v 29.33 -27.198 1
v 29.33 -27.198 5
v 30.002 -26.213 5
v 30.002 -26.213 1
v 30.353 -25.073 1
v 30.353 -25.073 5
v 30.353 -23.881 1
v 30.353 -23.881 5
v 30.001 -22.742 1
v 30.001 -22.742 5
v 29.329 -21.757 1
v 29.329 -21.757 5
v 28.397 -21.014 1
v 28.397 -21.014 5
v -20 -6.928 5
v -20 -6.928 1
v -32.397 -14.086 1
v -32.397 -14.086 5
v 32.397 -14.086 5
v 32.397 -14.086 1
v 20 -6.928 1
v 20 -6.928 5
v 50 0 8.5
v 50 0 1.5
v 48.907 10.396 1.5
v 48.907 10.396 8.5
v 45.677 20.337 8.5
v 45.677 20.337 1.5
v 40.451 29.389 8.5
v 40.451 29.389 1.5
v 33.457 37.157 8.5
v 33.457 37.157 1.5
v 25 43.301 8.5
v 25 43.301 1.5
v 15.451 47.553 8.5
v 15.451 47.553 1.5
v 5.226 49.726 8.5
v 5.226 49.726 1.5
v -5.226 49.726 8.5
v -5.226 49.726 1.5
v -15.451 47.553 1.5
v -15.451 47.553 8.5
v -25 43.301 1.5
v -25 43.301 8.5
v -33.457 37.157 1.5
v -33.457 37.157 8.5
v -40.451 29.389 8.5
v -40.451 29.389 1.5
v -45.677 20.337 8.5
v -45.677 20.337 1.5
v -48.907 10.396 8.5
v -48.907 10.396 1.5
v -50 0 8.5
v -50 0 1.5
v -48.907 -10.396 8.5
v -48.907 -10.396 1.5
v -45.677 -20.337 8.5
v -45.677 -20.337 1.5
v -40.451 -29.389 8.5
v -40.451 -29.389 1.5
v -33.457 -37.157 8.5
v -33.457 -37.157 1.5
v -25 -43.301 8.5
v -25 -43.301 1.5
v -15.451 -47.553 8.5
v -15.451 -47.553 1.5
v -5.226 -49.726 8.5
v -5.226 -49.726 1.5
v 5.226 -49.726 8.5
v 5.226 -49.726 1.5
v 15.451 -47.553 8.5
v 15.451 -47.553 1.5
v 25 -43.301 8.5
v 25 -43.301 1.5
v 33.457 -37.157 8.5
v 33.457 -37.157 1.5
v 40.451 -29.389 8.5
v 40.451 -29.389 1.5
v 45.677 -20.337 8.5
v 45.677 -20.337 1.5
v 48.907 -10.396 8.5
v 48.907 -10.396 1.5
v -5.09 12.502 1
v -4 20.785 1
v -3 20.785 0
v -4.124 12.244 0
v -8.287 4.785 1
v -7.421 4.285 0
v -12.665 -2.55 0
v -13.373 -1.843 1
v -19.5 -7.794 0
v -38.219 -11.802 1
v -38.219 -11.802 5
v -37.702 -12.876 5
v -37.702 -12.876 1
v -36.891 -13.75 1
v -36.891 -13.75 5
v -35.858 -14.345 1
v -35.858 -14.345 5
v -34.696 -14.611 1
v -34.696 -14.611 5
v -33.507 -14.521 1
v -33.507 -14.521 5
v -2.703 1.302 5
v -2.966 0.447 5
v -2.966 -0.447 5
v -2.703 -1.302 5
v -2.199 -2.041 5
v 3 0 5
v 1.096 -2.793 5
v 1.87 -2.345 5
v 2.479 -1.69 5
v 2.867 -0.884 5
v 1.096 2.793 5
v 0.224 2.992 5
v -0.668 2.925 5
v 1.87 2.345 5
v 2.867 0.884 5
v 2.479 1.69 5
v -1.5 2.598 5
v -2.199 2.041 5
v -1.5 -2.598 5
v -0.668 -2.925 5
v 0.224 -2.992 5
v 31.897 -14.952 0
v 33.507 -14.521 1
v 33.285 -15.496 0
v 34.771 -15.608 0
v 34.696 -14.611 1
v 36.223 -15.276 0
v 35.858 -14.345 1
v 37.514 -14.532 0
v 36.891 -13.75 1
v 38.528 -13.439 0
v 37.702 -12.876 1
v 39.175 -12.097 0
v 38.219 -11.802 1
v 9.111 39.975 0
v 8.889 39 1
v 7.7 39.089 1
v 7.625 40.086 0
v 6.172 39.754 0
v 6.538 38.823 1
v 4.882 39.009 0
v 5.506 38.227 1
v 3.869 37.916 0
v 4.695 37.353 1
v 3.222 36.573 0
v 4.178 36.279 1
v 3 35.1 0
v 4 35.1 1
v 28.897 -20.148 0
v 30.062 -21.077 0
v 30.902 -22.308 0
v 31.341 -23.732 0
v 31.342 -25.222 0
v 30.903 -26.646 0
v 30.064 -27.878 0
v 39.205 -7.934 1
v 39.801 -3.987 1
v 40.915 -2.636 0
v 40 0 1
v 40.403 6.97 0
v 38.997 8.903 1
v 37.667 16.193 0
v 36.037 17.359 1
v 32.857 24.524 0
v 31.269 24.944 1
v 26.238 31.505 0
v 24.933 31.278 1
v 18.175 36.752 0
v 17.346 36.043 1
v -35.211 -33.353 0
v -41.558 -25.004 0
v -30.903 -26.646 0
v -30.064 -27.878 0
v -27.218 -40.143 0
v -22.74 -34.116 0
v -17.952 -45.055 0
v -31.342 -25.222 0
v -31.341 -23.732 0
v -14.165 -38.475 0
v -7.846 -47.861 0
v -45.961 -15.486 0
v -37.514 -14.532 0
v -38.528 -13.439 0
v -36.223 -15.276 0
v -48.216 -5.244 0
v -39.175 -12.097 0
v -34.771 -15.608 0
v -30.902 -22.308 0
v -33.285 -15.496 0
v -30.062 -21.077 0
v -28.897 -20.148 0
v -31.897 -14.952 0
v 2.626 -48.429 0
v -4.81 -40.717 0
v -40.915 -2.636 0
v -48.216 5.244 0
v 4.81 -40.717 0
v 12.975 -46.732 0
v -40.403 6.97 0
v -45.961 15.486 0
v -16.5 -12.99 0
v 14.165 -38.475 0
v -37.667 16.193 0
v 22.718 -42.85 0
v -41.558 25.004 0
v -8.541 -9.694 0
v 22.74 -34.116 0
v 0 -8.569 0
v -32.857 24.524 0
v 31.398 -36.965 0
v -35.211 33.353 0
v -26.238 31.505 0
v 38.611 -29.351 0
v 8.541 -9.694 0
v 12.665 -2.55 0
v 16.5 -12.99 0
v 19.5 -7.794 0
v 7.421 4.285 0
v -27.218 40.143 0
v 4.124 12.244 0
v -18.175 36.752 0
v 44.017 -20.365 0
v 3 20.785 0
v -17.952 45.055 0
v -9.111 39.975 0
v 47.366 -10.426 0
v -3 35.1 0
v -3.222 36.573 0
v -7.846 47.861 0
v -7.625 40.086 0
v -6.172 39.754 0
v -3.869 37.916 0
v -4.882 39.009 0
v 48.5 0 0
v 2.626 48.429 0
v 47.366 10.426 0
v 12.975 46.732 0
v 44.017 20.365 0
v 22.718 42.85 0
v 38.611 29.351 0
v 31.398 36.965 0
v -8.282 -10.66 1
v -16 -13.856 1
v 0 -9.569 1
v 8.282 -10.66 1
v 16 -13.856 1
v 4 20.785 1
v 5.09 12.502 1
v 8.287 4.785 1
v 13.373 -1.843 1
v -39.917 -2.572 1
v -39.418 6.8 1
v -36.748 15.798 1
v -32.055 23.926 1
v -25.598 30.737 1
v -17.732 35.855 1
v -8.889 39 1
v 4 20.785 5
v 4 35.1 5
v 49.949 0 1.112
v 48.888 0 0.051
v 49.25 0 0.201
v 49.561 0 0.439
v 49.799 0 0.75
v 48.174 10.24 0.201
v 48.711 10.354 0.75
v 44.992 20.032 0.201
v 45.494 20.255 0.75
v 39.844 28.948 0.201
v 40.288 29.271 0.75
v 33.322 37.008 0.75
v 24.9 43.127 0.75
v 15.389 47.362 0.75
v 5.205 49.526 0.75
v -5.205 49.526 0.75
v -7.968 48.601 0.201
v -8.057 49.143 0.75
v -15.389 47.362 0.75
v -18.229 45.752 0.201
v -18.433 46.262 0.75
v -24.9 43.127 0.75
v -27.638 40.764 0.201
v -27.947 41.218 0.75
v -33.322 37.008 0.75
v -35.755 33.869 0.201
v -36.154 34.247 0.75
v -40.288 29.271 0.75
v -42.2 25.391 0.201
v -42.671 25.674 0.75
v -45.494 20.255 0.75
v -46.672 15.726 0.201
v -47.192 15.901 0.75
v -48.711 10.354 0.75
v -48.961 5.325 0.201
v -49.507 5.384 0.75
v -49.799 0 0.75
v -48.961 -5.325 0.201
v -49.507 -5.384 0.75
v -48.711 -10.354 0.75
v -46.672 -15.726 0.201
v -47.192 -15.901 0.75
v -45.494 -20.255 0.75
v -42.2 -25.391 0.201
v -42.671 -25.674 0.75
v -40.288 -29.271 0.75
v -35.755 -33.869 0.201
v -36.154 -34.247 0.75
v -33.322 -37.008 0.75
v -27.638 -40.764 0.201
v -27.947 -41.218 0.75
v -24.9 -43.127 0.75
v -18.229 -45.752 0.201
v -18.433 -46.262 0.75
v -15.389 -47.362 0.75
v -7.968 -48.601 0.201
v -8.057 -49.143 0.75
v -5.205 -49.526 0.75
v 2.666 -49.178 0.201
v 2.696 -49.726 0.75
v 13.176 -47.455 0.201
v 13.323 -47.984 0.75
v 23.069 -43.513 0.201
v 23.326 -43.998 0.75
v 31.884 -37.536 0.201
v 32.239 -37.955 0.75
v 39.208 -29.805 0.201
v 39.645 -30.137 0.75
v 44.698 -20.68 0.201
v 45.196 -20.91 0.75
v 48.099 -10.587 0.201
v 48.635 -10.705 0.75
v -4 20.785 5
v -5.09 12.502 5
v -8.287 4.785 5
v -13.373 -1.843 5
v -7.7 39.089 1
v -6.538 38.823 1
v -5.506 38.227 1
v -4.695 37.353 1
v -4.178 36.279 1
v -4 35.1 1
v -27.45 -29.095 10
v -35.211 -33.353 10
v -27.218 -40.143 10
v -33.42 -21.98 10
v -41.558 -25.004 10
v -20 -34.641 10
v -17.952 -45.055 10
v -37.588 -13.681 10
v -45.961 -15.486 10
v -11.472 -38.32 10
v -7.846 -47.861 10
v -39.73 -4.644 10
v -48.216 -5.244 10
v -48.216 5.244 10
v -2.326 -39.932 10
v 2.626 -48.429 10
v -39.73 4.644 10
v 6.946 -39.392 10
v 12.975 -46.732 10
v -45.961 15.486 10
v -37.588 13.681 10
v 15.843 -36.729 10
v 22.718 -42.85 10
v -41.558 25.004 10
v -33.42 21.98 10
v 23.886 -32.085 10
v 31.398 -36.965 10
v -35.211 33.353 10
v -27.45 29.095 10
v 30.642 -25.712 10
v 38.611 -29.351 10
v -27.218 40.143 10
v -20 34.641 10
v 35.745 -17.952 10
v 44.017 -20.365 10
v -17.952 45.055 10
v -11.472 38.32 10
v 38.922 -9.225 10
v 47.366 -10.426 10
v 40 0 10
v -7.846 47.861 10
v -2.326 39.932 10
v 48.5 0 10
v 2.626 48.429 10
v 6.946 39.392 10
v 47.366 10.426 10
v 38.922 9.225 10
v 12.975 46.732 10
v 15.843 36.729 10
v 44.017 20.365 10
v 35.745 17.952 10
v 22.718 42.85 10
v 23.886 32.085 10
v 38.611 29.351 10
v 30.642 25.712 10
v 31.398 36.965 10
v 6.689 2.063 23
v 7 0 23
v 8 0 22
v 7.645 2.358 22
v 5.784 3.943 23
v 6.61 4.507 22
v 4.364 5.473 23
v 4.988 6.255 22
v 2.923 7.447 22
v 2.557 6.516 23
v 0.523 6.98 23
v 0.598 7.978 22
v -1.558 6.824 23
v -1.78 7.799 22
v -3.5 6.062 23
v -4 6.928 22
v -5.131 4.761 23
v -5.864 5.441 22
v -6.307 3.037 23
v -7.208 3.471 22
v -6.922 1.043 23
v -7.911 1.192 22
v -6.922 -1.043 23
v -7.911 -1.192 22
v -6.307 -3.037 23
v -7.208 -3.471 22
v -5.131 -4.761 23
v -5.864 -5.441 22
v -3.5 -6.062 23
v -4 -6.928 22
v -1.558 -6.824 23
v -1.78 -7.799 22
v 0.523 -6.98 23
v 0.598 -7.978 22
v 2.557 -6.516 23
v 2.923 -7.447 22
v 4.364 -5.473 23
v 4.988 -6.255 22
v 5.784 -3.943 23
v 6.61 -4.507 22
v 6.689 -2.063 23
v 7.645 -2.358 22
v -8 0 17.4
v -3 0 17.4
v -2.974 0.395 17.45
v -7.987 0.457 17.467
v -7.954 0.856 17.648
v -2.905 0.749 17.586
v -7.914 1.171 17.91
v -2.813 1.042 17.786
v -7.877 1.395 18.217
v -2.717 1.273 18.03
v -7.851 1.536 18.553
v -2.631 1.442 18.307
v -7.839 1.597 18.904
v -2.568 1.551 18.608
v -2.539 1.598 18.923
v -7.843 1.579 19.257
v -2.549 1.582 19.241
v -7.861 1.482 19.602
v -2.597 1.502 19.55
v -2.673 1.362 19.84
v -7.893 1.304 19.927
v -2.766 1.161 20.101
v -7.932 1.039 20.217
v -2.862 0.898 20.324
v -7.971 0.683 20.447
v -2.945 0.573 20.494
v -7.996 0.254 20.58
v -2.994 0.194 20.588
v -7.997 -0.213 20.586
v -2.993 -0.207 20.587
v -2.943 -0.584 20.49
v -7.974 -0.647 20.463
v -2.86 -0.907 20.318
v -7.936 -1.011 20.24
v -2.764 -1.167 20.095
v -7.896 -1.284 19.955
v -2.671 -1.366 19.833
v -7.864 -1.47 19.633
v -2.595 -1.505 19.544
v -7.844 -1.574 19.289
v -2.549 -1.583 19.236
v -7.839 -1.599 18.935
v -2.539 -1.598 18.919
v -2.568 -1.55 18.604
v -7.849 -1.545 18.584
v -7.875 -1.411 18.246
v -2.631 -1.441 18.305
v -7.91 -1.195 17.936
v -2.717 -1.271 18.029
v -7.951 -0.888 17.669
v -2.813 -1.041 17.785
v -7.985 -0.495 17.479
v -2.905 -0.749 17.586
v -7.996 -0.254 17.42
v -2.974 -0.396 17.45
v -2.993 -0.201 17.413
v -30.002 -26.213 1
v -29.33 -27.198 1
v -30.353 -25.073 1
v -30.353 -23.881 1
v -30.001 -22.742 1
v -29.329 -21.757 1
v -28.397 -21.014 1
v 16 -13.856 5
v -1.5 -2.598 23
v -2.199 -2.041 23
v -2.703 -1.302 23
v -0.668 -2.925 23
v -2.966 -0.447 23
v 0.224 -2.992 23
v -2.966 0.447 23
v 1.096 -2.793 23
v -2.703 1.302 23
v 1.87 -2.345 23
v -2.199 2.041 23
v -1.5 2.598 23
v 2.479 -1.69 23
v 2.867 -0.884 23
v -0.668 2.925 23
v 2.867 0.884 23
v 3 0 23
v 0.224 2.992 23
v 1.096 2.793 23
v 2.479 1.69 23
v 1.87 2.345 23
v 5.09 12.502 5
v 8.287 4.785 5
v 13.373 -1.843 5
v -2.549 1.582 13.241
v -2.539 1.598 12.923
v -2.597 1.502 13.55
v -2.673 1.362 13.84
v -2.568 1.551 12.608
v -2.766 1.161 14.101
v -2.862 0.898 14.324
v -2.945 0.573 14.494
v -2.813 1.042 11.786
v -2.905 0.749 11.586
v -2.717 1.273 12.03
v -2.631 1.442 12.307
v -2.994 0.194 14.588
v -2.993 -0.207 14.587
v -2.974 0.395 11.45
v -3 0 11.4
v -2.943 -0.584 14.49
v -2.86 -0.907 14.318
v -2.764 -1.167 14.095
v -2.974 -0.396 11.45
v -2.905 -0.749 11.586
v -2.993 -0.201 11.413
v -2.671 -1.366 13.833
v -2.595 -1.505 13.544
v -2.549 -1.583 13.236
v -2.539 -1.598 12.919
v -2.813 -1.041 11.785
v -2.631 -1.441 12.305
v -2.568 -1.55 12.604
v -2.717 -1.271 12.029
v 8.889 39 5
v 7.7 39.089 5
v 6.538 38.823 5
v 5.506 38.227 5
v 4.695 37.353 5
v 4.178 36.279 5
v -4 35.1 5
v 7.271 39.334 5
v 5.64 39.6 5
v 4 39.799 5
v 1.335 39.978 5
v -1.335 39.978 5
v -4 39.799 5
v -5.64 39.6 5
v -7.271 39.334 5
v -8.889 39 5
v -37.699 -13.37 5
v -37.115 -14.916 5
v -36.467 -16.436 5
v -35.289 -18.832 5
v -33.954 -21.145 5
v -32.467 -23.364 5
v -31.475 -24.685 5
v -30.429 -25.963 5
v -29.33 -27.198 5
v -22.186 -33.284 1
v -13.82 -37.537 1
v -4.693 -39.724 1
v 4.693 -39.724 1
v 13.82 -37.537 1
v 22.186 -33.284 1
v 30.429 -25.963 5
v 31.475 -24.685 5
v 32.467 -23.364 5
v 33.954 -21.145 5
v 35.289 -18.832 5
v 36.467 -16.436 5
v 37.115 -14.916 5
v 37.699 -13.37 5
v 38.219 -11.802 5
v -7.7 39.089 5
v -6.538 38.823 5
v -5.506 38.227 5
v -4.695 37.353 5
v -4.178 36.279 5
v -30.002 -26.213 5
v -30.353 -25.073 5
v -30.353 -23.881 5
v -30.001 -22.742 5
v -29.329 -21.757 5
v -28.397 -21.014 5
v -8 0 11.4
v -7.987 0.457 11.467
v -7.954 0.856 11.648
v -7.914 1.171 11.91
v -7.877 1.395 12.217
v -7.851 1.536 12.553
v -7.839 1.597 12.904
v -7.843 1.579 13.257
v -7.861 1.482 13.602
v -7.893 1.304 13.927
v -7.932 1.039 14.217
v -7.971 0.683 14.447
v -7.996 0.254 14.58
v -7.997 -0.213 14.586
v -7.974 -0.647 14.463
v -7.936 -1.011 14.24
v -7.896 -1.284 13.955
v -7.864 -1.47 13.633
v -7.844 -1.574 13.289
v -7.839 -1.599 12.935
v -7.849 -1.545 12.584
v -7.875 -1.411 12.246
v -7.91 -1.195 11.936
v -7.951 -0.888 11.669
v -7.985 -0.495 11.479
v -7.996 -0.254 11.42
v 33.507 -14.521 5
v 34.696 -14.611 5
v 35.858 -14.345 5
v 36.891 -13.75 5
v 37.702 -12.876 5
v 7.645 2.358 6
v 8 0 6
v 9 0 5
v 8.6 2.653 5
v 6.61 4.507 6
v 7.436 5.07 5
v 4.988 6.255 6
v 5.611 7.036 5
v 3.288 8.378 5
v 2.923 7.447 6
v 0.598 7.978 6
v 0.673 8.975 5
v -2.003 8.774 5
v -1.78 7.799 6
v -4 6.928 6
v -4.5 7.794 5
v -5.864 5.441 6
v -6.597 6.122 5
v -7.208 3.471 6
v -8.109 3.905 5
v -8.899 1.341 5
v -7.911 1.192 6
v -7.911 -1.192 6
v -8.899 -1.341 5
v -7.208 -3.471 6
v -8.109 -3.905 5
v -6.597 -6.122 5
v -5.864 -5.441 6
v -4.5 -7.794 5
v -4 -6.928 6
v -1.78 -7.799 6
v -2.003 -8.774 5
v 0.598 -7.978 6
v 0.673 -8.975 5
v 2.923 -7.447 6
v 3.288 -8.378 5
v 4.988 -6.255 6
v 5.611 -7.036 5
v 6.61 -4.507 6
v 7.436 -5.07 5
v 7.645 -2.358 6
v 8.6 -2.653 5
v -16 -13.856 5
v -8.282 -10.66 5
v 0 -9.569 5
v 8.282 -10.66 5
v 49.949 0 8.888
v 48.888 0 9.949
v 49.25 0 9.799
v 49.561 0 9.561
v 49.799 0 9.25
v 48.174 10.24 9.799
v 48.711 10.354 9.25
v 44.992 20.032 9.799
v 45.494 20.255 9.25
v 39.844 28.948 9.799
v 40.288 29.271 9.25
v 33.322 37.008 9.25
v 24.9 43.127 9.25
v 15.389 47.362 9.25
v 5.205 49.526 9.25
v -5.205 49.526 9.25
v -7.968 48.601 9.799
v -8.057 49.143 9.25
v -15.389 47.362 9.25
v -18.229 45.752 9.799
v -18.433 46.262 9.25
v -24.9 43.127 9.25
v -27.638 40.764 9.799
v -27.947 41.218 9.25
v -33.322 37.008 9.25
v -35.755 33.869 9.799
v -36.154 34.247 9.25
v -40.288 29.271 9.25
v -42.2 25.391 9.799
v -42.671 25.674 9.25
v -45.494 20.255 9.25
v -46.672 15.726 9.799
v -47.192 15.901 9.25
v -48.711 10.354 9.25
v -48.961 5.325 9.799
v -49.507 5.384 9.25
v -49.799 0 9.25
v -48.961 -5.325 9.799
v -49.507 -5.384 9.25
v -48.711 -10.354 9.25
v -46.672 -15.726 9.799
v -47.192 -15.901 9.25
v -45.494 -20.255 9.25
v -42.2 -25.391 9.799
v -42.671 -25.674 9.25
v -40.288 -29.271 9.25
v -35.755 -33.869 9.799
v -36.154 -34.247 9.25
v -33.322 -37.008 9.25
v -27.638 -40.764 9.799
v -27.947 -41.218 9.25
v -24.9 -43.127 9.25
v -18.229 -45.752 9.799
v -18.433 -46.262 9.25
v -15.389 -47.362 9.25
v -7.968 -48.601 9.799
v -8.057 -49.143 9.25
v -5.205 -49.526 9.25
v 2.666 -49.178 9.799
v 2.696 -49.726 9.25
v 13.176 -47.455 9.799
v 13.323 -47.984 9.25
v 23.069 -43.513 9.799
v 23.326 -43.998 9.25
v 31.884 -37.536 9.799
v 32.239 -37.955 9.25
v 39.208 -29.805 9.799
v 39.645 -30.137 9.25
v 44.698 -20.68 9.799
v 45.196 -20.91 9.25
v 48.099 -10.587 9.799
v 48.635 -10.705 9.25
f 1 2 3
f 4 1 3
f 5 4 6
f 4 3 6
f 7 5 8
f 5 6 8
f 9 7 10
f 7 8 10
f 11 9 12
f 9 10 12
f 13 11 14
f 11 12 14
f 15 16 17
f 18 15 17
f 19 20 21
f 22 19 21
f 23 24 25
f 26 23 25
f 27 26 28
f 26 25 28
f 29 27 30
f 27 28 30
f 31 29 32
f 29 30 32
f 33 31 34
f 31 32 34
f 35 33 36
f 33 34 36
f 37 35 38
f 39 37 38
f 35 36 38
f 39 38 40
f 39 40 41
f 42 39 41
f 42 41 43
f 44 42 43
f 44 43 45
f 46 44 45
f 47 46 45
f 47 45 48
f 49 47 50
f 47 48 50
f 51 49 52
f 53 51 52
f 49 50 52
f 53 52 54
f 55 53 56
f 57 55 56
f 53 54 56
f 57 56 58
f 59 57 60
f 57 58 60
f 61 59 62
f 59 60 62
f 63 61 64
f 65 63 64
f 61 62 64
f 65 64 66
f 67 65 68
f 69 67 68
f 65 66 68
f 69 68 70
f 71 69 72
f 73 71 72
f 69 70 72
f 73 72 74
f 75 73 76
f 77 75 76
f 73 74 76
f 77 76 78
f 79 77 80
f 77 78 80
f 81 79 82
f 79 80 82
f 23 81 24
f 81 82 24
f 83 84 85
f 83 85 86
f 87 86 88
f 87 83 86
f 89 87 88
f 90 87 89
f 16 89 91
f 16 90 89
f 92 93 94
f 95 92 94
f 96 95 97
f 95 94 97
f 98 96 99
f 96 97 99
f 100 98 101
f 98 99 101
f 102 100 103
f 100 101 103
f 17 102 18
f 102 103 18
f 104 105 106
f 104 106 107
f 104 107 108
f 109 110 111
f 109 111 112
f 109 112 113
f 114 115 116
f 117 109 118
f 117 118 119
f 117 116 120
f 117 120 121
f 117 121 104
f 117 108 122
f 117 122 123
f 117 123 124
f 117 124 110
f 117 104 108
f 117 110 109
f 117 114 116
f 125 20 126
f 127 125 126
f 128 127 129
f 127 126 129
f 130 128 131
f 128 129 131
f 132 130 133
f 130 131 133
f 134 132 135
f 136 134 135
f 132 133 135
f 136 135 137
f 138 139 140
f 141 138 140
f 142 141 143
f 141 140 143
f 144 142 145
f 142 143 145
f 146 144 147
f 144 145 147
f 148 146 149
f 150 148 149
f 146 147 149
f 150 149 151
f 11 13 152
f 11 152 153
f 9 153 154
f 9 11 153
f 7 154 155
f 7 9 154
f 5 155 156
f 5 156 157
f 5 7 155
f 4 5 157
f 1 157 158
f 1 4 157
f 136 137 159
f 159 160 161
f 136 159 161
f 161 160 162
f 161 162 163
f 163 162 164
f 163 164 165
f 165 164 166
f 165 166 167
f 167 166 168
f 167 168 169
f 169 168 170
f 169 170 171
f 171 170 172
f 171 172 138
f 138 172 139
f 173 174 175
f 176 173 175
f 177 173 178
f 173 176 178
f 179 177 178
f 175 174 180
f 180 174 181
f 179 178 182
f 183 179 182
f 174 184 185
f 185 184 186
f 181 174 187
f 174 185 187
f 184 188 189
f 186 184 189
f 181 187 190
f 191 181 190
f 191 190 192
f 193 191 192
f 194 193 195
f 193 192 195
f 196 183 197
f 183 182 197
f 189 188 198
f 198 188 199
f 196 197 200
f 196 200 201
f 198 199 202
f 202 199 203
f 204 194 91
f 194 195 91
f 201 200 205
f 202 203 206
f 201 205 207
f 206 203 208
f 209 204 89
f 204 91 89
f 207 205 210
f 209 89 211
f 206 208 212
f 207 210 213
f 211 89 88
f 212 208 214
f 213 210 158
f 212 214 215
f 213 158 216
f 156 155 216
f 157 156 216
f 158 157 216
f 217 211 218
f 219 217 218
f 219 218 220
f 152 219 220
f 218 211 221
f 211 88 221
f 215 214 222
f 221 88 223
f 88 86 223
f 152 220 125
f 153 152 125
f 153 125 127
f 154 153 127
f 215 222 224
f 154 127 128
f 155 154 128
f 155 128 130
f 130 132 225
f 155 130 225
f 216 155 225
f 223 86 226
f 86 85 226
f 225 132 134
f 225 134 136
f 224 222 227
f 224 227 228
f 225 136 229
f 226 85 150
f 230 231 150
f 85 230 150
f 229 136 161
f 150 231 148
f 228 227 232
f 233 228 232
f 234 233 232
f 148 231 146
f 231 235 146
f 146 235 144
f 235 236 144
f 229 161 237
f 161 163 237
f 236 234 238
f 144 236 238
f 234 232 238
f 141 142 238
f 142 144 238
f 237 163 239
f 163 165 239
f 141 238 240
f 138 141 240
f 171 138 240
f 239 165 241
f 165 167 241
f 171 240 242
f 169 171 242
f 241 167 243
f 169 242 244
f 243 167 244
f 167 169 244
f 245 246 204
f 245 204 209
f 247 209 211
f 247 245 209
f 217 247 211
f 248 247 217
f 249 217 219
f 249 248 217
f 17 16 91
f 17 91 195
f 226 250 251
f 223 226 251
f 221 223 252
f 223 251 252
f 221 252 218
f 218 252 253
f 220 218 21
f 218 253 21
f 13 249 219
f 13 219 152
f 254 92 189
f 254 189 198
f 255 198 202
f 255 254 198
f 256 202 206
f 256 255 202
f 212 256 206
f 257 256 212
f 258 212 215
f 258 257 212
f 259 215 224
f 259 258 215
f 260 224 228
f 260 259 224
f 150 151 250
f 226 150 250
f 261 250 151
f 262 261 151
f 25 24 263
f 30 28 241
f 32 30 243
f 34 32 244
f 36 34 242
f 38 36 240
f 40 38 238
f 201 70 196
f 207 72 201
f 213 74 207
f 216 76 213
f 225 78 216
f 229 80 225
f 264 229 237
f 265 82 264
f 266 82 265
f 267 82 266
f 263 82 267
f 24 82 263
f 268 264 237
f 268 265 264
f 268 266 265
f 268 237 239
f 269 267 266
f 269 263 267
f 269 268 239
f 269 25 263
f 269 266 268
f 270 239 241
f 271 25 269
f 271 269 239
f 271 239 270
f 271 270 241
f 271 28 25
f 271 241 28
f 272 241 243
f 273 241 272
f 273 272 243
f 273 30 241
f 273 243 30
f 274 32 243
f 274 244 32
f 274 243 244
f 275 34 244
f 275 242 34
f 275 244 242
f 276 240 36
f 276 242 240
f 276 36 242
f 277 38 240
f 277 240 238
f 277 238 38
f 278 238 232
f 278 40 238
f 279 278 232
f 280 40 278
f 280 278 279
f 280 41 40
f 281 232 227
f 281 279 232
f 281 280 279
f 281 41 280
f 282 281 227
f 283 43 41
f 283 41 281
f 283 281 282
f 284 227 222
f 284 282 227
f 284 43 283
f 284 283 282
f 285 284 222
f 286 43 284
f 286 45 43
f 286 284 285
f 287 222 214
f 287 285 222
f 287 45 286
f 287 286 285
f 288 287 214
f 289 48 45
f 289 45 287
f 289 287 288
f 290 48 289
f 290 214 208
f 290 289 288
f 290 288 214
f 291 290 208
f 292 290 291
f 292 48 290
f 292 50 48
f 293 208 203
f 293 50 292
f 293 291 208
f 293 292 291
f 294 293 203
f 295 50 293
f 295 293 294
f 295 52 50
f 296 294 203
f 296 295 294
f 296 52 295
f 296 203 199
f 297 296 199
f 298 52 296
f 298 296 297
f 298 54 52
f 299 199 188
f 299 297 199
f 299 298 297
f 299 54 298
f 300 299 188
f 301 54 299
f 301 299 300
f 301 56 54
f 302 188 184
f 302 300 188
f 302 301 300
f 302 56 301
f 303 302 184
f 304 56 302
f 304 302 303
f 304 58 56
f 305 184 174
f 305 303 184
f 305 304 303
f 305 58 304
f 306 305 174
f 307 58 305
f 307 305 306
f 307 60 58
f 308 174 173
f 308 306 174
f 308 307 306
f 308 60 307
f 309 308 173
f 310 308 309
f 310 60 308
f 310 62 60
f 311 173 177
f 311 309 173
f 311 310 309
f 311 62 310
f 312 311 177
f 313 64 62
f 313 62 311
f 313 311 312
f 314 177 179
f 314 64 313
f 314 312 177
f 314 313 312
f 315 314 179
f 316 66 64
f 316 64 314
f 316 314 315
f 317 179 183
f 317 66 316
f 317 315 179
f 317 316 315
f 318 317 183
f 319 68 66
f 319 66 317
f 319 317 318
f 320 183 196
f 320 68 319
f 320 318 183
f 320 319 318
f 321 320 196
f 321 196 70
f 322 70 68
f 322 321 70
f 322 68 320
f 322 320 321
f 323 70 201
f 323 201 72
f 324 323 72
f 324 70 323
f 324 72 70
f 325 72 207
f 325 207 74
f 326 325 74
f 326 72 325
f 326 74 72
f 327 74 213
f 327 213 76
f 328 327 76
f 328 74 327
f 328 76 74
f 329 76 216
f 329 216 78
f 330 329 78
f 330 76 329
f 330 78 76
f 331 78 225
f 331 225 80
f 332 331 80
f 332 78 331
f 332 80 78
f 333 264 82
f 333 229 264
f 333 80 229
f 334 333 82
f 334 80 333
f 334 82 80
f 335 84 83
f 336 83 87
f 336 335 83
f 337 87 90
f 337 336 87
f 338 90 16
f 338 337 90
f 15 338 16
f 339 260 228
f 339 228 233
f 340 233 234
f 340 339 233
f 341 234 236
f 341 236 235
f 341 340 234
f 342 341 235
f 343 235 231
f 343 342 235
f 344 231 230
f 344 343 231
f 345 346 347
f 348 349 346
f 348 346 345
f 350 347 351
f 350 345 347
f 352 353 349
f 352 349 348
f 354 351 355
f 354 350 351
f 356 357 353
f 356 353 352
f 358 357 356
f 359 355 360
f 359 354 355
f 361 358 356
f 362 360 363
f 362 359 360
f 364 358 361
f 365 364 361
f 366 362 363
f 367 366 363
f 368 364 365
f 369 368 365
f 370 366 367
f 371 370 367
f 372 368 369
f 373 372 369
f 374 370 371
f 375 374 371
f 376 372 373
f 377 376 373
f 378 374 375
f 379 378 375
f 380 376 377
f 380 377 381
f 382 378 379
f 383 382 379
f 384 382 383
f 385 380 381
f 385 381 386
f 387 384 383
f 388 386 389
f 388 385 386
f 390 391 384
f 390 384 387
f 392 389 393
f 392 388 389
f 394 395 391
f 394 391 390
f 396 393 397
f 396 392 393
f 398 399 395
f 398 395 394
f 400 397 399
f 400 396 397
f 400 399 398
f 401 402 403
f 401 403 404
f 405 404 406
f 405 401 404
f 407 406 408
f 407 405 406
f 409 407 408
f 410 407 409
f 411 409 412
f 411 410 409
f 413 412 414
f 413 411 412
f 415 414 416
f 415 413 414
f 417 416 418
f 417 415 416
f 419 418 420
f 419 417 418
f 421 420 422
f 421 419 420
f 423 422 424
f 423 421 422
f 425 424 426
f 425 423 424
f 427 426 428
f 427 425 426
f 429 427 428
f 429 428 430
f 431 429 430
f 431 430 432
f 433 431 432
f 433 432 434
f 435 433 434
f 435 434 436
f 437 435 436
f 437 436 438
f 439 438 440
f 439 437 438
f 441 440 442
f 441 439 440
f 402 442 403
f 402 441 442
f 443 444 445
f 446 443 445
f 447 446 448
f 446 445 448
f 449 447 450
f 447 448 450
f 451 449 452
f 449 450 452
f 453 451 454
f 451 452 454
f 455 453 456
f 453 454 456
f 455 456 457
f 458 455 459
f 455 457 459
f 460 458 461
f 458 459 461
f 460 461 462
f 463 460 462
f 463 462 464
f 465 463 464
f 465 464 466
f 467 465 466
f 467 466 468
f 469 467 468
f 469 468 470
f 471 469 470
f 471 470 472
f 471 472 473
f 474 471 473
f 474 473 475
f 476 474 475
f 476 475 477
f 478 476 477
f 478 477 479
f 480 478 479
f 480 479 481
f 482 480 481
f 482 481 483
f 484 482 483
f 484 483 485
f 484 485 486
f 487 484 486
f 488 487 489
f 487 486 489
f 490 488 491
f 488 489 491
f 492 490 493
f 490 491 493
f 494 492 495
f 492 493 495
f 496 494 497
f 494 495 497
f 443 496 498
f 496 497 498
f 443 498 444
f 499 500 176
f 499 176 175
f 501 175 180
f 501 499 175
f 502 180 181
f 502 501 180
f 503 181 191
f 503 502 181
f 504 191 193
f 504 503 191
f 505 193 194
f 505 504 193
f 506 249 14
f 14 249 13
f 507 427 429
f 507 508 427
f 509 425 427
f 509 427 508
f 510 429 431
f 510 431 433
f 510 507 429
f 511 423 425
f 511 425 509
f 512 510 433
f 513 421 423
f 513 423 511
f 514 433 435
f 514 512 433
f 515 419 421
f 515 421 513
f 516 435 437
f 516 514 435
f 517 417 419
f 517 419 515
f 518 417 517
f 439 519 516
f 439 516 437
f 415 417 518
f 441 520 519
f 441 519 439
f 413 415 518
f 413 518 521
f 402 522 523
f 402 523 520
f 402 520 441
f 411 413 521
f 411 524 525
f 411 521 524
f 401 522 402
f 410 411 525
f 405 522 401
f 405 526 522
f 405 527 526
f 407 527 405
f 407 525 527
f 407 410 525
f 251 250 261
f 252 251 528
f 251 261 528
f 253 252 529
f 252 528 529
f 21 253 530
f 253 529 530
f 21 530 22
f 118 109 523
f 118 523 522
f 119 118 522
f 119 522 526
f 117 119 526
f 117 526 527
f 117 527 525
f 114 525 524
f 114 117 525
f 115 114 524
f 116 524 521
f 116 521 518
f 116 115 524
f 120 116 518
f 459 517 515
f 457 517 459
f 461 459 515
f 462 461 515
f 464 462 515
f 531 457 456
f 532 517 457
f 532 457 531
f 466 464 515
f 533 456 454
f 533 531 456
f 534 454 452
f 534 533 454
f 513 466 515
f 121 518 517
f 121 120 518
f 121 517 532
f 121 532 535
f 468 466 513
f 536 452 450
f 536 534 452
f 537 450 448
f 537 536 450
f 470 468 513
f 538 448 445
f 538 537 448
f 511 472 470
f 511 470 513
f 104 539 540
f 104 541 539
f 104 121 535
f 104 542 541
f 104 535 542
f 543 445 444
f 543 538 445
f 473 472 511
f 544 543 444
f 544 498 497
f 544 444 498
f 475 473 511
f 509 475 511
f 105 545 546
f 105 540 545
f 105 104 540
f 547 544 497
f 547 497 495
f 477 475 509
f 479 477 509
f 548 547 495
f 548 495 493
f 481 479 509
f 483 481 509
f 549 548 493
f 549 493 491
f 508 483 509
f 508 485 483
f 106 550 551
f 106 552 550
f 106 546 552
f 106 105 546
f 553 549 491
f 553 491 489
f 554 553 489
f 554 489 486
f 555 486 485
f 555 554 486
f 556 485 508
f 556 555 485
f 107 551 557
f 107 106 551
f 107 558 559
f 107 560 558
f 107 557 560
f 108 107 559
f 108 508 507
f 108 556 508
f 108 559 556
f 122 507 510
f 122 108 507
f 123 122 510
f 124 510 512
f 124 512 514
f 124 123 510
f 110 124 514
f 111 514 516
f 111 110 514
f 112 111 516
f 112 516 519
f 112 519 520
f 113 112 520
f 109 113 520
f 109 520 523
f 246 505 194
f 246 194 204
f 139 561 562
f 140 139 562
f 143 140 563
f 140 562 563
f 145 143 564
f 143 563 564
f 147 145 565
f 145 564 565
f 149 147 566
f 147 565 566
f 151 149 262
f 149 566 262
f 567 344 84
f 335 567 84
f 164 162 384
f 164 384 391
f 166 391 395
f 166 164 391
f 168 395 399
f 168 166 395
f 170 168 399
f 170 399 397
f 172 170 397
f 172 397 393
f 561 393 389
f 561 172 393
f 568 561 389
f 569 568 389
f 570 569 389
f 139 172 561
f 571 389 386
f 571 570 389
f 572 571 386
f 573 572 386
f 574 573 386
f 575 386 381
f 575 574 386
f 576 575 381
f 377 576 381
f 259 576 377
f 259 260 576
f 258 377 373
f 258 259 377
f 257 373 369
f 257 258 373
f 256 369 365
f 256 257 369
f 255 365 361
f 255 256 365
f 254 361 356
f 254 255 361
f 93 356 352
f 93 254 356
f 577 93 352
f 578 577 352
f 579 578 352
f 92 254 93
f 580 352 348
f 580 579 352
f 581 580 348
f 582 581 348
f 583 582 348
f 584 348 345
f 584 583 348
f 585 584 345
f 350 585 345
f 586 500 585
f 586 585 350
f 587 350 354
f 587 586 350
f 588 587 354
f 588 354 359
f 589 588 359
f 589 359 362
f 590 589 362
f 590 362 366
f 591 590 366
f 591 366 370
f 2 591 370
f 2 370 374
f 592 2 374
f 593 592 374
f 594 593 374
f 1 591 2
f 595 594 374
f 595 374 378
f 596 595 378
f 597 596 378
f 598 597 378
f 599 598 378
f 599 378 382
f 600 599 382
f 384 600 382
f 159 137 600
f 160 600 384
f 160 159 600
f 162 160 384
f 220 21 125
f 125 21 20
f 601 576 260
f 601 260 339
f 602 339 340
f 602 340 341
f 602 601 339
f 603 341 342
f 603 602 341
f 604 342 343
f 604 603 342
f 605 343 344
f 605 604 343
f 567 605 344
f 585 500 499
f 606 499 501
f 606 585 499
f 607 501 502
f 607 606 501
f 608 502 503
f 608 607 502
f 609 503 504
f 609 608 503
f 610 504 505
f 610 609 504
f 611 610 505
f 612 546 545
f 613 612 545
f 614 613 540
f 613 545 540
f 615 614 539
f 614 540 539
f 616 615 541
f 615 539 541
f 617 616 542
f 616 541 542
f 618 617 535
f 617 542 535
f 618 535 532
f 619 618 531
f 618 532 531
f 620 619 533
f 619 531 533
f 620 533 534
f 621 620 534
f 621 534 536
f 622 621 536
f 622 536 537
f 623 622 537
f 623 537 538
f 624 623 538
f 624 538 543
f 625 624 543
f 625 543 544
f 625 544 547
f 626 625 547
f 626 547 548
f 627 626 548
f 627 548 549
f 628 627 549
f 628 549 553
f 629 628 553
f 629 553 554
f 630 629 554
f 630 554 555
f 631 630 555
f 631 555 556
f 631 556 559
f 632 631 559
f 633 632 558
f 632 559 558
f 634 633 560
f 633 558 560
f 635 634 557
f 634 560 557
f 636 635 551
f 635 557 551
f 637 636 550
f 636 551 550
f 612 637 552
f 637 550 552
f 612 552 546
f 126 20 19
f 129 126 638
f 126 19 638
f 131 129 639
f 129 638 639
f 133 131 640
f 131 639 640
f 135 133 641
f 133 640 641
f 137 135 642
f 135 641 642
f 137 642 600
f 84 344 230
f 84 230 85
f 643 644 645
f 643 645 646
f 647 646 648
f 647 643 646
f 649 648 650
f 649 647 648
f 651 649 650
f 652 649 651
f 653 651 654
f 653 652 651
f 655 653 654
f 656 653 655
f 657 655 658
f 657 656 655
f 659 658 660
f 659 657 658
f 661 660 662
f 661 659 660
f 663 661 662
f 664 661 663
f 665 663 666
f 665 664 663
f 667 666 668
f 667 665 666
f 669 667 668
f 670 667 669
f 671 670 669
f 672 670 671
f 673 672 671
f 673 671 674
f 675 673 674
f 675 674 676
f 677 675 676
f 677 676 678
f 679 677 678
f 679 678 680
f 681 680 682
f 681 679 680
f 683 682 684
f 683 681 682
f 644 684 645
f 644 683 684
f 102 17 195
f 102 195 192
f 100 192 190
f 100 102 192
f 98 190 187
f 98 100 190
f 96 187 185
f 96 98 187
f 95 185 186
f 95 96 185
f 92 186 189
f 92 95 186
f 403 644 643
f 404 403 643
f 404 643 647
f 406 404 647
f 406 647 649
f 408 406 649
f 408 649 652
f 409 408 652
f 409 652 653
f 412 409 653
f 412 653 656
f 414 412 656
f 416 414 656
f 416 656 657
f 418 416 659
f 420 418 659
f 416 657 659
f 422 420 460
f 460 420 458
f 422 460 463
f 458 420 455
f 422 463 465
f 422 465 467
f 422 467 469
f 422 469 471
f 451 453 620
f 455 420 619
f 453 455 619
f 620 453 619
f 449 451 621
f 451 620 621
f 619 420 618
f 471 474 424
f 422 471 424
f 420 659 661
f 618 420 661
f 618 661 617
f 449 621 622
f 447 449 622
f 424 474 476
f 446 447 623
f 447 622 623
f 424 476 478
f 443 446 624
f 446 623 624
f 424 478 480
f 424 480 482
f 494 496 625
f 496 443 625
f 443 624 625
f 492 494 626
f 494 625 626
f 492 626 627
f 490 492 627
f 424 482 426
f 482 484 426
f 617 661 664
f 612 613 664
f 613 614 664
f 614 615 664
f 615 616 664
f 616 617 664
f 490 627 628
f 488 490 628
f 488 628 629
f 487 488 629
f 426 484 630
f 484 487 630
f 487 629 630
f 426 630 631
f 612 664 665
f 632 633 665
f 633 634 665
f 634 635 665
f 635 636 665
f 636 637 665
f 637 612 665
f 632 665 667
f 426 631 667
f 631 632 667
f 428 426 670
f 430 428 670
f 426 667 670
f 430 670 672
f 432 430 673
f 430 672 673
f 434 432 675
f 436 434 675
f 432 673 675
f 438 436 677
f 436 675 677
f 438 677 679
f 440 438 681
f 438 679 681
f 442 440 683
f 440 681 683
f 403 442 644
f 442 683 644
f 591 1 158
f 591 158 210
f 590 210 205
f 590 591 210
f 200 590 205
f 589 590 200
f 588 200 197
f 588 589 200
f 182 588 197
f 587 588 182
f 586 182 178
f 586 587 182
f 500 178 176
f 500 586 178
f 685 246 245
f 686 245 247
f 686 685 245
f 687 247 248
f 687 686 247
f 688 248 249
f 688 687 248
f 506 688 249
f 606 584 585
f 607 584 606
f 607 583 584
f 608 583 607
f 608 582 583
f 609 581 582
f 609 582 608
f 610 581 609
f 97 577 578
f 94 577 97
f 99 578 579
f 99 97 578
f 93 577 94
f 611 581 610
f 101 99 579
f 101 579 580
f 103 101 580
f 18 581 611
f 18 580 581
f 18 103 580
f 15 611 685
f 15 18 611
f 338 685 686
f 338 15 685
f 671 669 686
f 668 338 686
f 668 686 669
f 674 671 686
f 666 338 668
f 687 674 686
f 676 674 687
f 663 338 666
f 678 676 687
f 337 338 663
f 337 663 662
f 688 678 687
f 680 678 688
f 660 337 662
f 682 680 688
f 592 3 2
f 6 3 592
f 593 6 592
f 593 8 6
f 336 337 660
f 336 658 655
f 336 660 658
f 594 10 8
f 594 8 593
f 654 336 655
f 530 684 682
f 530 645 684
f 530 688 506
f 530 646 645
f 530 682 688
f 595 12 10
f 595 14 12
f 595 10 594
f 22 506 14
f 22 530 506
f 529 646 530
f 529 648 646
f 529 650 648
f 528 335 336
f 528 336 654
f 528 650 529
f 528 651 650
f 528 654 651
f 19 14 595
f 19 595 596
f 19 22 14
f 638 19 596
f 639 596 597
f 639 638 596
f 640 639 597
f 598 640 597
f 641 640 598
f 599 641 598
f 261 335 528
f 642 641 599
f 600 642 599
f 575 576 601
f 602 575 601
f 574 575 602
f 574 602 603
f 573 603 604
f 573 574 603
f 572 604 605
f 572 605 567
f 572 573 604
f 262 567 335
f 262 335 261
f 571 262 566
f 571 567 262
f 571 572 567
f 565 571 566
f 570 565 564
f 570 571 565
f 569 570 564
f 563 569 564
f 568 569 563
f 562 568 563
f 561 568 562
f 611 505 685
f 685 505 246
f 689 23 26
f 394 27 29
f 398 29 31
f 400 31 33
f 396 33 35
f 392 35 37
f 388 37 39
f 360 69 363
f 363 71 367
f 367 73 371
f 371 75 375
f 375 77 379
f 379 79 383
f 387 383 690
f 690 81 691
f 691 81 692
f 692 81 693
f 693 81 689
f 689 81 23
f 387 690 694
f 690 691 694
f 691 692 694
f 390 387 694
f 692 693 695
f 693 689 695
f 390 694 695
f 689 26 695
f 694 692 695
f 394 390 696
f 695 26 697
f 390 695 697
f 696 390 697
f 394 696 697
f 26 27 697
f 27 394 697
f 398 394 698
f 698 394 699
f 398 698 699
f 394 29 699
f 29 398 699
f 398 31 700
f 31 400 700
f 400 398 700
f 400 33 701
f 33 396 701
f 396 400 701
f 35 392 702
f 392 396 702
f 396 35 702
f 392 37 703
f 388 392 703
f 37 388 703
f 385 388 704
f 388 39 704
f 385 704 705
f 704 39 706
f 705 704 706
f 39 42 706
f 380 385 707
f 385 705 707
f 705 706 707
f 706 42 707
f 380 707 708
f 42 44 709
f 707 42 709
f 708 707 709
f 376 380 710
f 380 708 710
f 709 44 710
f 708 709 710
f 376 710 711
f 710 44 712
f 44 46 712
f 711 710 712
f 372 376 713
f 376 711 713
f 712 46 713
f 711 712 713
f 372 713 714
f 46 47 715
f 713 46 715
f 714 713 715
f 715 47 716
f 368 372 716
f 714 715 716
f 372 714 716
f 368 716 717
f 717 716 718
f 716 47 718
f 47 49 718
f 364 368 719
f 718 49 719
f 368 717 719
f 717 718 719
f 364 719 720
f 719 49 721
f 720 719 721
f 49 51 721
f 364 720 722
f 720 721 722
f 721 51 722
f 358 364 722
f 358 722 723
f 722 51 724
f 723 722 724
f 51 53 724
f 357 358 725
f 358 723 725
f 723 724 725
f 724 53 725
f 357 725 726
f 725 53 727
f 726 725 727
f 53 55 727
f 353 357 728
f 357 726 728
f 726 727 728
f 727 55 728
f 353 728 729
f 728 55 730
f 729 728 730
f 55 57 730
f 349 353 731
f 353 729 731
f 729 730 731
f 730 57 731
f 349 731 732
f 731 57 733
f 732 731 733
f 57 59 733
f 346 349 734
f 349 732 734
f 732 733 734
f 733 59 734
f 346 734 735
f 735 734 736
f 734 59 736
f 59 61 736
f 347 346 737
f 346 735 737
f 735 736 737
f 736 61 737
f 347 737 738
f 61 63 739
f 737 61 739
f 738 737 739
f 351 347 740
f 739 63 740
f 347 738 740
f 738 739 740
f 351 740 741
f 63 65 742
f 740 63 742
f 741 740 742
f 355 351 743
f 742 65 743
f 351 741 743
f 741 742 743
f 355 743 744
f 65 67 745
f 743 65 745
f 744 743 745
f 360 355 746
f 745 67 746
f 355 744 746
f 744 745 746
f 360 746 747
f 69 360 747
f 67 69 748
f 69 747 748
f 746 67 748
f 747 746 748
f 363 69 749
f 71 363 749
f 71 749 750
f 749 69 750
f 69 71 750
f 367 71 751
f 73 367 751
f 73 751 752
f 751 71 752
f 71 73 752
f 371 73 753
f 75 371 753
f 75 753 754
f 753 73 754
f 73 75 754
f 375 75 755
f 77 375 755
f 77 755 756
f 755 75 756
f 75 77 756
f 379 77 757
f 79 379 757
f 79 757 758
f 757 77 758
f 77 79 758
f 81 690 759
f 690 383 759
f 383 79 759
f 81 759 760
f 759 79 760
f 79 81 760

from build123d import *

# Parameters (mm, degrees)
SKETCH1_R           = 50
SKETCH1_R_2         = 40
BOSS_EXTRUDE1_DEPTH = 10
BOSS_EXTRUDE3_DEPTH = 5
FILLET1_R           = 32
FILLET2_R           = 4
CHAMFER1_SIZE       = 1
FILLET3_R           = 1.5
SKETCH2_R           = 8
SKETCH2_R_2         = 3
BOSS_EXTRUDE4_DEPTH = 18
CHAMFER2_SIZE       = 1
SKETCH3_R           = 1.6
CUT_EXTRUDE1_DEPTH  = 10


with BuildPart() as part:
    # Sketch1 → Boss-Extrude1 (new body)
    with BuildSketch(Plane.XY):
        Circle(SKETCH1_R)
        Circle(SKETCH1_R_2, mode=Mode.SUBTRACT)
    extrude(amount=BOSS_EXTRUDE1_DEPTH)

    # Sketch1<5> → Boss-Extrude3 (add)
    with BuildSketch(Plane.XY):
        with BuildLine():
            ThreePointArc((4, 39.799497484), (0, 40), (-4, 39.799497484))
            Line((-4, 39.799497484), (-4, 2.309401077))
            Line((-4, 2.309401077), (-36.467375879, -16.435647127))
            ThreePointArc((-36.467375879, -16.435647127), (-34.641016151, -20), (-32.467375879, -23.363850357))
            Line((-32.467375879, -23.363850357), (0, -4.618802154))
            Line((0, -4.618802154), (32.467375879, -23.363850357))
            ThreePointArc((32.467375879, -23.363850357), (34.641016151, -20), (36.467375879, -16.435647127))
            Line((36.467375879, -16.435647127), (4, 2.309401077))
            Line((4, 2.309401077), (4, 39.799497484))
        make_face()
    extrude(amount=BOSS_EXTRUDE3_DEPTH)

    # Fillet1
    fillet1_edges = [part.edges().sort_by_distance(p)[0] for p in [
        (-4, 2.309401077, 2.5),
        (0, -4.618802154, 2.5),
        (4, 2.309401077, 2.5),
    ]]
    fillet(fillet1_edges, radius=FILLET1_R)

    # Fillet2
    fillet2_edges = [part.edges().sort_by_distance(p)[0] for p in [
        (-36.467375879, -16.435647127, 2.5),
        (-32.467375879, -23.363850357, 2.5),
        (32.467375879, -23.363850357, 2.5),
        (36.467375879, -16.435647127, 2.5),
        (4, 39.799497484, 2.5),
        (-4, 39.799497484, 2.5),
    ]]
    fillet(fillet2_edges, radius=FILLET2_R)

    # Chamfer1
    chamfer1_edges = [part.edges().sort_by_distance(p)[0] for p in [
        (0, -9.569219382, 0),
        (-8.287187079, 4.784609691, 0),
        (8.287187079, 4.784609691, 0),
        (26.198684154, -10.507015195, 0),
        (31.269438399, 24.944382578, 0),
        (0, -40, 0),
        (-34.641016151, 20, 0),
        (22.198684154, -17.435218425, 0),
        (-26.198684154, -10.507015195, 0),
        (-22.198684154, -17.435218425, 0),
        (-4, 27.94223362, 0),
        (4, 27.94223362, 0),
        (35.85816198, -14.345444364, 0),
        (30.352600238, -23.881357026, 0),
        (-35.85816198, -14.345444364, 0),
        (-30.352600238, -23.881357026, 0),
        (-5.505561742, 38.226801389, 0),
        (5.505561742, 38.226801389, 0),
    ]]
    chamfer(chamfer1_edges, length=CHAMFER1_SIZE)

    # Fillet3
    fillet3_edges = [part.edges().sort_by_distance(p)[0] for p in [
        (-50, 0, 10),
        (-50, 0, 0),
    ]]
    fillet(fillet3_edges, radius=FILLET3_R)

    # Sketch2 → Boss-Extrude4 (add)
    with BuildSketch(Plane.XY.offset(5)):
        Circle(SKETCH2_R)
        Circle(SKETCH2_R_2, mode=Mode.SUBTRACT)
    extrude(amount=BOSS_EXTRUDE4_DEPTH)

    # Chamfer2
    chamfer2_edges = [part.edges().sort_by_distance(p)[0] for p in [
        (-8, 0, 23),
        (-8, 0, 5),
    ]]
    chamfer(chamfer2_edges, length=CHAMFER2_SIZE)

    # Sketch3 → Cut-Extrude1 (cut)
    with BuildSketch(Plane(origin=(0, 0, 0), x_dir=(0, 0, -1), z_dir=(1, 0, 0))):
        with Locations((-19, 0)):
            Circle(SKETCH3_R)
        with Locations((-13, 0)):
            Circle(SKETCH3_R)
    extrude(amount=-CUT_EXTRUDE1_DEPTH, mode=Mode.SUBTRACT)


solid = part.part
